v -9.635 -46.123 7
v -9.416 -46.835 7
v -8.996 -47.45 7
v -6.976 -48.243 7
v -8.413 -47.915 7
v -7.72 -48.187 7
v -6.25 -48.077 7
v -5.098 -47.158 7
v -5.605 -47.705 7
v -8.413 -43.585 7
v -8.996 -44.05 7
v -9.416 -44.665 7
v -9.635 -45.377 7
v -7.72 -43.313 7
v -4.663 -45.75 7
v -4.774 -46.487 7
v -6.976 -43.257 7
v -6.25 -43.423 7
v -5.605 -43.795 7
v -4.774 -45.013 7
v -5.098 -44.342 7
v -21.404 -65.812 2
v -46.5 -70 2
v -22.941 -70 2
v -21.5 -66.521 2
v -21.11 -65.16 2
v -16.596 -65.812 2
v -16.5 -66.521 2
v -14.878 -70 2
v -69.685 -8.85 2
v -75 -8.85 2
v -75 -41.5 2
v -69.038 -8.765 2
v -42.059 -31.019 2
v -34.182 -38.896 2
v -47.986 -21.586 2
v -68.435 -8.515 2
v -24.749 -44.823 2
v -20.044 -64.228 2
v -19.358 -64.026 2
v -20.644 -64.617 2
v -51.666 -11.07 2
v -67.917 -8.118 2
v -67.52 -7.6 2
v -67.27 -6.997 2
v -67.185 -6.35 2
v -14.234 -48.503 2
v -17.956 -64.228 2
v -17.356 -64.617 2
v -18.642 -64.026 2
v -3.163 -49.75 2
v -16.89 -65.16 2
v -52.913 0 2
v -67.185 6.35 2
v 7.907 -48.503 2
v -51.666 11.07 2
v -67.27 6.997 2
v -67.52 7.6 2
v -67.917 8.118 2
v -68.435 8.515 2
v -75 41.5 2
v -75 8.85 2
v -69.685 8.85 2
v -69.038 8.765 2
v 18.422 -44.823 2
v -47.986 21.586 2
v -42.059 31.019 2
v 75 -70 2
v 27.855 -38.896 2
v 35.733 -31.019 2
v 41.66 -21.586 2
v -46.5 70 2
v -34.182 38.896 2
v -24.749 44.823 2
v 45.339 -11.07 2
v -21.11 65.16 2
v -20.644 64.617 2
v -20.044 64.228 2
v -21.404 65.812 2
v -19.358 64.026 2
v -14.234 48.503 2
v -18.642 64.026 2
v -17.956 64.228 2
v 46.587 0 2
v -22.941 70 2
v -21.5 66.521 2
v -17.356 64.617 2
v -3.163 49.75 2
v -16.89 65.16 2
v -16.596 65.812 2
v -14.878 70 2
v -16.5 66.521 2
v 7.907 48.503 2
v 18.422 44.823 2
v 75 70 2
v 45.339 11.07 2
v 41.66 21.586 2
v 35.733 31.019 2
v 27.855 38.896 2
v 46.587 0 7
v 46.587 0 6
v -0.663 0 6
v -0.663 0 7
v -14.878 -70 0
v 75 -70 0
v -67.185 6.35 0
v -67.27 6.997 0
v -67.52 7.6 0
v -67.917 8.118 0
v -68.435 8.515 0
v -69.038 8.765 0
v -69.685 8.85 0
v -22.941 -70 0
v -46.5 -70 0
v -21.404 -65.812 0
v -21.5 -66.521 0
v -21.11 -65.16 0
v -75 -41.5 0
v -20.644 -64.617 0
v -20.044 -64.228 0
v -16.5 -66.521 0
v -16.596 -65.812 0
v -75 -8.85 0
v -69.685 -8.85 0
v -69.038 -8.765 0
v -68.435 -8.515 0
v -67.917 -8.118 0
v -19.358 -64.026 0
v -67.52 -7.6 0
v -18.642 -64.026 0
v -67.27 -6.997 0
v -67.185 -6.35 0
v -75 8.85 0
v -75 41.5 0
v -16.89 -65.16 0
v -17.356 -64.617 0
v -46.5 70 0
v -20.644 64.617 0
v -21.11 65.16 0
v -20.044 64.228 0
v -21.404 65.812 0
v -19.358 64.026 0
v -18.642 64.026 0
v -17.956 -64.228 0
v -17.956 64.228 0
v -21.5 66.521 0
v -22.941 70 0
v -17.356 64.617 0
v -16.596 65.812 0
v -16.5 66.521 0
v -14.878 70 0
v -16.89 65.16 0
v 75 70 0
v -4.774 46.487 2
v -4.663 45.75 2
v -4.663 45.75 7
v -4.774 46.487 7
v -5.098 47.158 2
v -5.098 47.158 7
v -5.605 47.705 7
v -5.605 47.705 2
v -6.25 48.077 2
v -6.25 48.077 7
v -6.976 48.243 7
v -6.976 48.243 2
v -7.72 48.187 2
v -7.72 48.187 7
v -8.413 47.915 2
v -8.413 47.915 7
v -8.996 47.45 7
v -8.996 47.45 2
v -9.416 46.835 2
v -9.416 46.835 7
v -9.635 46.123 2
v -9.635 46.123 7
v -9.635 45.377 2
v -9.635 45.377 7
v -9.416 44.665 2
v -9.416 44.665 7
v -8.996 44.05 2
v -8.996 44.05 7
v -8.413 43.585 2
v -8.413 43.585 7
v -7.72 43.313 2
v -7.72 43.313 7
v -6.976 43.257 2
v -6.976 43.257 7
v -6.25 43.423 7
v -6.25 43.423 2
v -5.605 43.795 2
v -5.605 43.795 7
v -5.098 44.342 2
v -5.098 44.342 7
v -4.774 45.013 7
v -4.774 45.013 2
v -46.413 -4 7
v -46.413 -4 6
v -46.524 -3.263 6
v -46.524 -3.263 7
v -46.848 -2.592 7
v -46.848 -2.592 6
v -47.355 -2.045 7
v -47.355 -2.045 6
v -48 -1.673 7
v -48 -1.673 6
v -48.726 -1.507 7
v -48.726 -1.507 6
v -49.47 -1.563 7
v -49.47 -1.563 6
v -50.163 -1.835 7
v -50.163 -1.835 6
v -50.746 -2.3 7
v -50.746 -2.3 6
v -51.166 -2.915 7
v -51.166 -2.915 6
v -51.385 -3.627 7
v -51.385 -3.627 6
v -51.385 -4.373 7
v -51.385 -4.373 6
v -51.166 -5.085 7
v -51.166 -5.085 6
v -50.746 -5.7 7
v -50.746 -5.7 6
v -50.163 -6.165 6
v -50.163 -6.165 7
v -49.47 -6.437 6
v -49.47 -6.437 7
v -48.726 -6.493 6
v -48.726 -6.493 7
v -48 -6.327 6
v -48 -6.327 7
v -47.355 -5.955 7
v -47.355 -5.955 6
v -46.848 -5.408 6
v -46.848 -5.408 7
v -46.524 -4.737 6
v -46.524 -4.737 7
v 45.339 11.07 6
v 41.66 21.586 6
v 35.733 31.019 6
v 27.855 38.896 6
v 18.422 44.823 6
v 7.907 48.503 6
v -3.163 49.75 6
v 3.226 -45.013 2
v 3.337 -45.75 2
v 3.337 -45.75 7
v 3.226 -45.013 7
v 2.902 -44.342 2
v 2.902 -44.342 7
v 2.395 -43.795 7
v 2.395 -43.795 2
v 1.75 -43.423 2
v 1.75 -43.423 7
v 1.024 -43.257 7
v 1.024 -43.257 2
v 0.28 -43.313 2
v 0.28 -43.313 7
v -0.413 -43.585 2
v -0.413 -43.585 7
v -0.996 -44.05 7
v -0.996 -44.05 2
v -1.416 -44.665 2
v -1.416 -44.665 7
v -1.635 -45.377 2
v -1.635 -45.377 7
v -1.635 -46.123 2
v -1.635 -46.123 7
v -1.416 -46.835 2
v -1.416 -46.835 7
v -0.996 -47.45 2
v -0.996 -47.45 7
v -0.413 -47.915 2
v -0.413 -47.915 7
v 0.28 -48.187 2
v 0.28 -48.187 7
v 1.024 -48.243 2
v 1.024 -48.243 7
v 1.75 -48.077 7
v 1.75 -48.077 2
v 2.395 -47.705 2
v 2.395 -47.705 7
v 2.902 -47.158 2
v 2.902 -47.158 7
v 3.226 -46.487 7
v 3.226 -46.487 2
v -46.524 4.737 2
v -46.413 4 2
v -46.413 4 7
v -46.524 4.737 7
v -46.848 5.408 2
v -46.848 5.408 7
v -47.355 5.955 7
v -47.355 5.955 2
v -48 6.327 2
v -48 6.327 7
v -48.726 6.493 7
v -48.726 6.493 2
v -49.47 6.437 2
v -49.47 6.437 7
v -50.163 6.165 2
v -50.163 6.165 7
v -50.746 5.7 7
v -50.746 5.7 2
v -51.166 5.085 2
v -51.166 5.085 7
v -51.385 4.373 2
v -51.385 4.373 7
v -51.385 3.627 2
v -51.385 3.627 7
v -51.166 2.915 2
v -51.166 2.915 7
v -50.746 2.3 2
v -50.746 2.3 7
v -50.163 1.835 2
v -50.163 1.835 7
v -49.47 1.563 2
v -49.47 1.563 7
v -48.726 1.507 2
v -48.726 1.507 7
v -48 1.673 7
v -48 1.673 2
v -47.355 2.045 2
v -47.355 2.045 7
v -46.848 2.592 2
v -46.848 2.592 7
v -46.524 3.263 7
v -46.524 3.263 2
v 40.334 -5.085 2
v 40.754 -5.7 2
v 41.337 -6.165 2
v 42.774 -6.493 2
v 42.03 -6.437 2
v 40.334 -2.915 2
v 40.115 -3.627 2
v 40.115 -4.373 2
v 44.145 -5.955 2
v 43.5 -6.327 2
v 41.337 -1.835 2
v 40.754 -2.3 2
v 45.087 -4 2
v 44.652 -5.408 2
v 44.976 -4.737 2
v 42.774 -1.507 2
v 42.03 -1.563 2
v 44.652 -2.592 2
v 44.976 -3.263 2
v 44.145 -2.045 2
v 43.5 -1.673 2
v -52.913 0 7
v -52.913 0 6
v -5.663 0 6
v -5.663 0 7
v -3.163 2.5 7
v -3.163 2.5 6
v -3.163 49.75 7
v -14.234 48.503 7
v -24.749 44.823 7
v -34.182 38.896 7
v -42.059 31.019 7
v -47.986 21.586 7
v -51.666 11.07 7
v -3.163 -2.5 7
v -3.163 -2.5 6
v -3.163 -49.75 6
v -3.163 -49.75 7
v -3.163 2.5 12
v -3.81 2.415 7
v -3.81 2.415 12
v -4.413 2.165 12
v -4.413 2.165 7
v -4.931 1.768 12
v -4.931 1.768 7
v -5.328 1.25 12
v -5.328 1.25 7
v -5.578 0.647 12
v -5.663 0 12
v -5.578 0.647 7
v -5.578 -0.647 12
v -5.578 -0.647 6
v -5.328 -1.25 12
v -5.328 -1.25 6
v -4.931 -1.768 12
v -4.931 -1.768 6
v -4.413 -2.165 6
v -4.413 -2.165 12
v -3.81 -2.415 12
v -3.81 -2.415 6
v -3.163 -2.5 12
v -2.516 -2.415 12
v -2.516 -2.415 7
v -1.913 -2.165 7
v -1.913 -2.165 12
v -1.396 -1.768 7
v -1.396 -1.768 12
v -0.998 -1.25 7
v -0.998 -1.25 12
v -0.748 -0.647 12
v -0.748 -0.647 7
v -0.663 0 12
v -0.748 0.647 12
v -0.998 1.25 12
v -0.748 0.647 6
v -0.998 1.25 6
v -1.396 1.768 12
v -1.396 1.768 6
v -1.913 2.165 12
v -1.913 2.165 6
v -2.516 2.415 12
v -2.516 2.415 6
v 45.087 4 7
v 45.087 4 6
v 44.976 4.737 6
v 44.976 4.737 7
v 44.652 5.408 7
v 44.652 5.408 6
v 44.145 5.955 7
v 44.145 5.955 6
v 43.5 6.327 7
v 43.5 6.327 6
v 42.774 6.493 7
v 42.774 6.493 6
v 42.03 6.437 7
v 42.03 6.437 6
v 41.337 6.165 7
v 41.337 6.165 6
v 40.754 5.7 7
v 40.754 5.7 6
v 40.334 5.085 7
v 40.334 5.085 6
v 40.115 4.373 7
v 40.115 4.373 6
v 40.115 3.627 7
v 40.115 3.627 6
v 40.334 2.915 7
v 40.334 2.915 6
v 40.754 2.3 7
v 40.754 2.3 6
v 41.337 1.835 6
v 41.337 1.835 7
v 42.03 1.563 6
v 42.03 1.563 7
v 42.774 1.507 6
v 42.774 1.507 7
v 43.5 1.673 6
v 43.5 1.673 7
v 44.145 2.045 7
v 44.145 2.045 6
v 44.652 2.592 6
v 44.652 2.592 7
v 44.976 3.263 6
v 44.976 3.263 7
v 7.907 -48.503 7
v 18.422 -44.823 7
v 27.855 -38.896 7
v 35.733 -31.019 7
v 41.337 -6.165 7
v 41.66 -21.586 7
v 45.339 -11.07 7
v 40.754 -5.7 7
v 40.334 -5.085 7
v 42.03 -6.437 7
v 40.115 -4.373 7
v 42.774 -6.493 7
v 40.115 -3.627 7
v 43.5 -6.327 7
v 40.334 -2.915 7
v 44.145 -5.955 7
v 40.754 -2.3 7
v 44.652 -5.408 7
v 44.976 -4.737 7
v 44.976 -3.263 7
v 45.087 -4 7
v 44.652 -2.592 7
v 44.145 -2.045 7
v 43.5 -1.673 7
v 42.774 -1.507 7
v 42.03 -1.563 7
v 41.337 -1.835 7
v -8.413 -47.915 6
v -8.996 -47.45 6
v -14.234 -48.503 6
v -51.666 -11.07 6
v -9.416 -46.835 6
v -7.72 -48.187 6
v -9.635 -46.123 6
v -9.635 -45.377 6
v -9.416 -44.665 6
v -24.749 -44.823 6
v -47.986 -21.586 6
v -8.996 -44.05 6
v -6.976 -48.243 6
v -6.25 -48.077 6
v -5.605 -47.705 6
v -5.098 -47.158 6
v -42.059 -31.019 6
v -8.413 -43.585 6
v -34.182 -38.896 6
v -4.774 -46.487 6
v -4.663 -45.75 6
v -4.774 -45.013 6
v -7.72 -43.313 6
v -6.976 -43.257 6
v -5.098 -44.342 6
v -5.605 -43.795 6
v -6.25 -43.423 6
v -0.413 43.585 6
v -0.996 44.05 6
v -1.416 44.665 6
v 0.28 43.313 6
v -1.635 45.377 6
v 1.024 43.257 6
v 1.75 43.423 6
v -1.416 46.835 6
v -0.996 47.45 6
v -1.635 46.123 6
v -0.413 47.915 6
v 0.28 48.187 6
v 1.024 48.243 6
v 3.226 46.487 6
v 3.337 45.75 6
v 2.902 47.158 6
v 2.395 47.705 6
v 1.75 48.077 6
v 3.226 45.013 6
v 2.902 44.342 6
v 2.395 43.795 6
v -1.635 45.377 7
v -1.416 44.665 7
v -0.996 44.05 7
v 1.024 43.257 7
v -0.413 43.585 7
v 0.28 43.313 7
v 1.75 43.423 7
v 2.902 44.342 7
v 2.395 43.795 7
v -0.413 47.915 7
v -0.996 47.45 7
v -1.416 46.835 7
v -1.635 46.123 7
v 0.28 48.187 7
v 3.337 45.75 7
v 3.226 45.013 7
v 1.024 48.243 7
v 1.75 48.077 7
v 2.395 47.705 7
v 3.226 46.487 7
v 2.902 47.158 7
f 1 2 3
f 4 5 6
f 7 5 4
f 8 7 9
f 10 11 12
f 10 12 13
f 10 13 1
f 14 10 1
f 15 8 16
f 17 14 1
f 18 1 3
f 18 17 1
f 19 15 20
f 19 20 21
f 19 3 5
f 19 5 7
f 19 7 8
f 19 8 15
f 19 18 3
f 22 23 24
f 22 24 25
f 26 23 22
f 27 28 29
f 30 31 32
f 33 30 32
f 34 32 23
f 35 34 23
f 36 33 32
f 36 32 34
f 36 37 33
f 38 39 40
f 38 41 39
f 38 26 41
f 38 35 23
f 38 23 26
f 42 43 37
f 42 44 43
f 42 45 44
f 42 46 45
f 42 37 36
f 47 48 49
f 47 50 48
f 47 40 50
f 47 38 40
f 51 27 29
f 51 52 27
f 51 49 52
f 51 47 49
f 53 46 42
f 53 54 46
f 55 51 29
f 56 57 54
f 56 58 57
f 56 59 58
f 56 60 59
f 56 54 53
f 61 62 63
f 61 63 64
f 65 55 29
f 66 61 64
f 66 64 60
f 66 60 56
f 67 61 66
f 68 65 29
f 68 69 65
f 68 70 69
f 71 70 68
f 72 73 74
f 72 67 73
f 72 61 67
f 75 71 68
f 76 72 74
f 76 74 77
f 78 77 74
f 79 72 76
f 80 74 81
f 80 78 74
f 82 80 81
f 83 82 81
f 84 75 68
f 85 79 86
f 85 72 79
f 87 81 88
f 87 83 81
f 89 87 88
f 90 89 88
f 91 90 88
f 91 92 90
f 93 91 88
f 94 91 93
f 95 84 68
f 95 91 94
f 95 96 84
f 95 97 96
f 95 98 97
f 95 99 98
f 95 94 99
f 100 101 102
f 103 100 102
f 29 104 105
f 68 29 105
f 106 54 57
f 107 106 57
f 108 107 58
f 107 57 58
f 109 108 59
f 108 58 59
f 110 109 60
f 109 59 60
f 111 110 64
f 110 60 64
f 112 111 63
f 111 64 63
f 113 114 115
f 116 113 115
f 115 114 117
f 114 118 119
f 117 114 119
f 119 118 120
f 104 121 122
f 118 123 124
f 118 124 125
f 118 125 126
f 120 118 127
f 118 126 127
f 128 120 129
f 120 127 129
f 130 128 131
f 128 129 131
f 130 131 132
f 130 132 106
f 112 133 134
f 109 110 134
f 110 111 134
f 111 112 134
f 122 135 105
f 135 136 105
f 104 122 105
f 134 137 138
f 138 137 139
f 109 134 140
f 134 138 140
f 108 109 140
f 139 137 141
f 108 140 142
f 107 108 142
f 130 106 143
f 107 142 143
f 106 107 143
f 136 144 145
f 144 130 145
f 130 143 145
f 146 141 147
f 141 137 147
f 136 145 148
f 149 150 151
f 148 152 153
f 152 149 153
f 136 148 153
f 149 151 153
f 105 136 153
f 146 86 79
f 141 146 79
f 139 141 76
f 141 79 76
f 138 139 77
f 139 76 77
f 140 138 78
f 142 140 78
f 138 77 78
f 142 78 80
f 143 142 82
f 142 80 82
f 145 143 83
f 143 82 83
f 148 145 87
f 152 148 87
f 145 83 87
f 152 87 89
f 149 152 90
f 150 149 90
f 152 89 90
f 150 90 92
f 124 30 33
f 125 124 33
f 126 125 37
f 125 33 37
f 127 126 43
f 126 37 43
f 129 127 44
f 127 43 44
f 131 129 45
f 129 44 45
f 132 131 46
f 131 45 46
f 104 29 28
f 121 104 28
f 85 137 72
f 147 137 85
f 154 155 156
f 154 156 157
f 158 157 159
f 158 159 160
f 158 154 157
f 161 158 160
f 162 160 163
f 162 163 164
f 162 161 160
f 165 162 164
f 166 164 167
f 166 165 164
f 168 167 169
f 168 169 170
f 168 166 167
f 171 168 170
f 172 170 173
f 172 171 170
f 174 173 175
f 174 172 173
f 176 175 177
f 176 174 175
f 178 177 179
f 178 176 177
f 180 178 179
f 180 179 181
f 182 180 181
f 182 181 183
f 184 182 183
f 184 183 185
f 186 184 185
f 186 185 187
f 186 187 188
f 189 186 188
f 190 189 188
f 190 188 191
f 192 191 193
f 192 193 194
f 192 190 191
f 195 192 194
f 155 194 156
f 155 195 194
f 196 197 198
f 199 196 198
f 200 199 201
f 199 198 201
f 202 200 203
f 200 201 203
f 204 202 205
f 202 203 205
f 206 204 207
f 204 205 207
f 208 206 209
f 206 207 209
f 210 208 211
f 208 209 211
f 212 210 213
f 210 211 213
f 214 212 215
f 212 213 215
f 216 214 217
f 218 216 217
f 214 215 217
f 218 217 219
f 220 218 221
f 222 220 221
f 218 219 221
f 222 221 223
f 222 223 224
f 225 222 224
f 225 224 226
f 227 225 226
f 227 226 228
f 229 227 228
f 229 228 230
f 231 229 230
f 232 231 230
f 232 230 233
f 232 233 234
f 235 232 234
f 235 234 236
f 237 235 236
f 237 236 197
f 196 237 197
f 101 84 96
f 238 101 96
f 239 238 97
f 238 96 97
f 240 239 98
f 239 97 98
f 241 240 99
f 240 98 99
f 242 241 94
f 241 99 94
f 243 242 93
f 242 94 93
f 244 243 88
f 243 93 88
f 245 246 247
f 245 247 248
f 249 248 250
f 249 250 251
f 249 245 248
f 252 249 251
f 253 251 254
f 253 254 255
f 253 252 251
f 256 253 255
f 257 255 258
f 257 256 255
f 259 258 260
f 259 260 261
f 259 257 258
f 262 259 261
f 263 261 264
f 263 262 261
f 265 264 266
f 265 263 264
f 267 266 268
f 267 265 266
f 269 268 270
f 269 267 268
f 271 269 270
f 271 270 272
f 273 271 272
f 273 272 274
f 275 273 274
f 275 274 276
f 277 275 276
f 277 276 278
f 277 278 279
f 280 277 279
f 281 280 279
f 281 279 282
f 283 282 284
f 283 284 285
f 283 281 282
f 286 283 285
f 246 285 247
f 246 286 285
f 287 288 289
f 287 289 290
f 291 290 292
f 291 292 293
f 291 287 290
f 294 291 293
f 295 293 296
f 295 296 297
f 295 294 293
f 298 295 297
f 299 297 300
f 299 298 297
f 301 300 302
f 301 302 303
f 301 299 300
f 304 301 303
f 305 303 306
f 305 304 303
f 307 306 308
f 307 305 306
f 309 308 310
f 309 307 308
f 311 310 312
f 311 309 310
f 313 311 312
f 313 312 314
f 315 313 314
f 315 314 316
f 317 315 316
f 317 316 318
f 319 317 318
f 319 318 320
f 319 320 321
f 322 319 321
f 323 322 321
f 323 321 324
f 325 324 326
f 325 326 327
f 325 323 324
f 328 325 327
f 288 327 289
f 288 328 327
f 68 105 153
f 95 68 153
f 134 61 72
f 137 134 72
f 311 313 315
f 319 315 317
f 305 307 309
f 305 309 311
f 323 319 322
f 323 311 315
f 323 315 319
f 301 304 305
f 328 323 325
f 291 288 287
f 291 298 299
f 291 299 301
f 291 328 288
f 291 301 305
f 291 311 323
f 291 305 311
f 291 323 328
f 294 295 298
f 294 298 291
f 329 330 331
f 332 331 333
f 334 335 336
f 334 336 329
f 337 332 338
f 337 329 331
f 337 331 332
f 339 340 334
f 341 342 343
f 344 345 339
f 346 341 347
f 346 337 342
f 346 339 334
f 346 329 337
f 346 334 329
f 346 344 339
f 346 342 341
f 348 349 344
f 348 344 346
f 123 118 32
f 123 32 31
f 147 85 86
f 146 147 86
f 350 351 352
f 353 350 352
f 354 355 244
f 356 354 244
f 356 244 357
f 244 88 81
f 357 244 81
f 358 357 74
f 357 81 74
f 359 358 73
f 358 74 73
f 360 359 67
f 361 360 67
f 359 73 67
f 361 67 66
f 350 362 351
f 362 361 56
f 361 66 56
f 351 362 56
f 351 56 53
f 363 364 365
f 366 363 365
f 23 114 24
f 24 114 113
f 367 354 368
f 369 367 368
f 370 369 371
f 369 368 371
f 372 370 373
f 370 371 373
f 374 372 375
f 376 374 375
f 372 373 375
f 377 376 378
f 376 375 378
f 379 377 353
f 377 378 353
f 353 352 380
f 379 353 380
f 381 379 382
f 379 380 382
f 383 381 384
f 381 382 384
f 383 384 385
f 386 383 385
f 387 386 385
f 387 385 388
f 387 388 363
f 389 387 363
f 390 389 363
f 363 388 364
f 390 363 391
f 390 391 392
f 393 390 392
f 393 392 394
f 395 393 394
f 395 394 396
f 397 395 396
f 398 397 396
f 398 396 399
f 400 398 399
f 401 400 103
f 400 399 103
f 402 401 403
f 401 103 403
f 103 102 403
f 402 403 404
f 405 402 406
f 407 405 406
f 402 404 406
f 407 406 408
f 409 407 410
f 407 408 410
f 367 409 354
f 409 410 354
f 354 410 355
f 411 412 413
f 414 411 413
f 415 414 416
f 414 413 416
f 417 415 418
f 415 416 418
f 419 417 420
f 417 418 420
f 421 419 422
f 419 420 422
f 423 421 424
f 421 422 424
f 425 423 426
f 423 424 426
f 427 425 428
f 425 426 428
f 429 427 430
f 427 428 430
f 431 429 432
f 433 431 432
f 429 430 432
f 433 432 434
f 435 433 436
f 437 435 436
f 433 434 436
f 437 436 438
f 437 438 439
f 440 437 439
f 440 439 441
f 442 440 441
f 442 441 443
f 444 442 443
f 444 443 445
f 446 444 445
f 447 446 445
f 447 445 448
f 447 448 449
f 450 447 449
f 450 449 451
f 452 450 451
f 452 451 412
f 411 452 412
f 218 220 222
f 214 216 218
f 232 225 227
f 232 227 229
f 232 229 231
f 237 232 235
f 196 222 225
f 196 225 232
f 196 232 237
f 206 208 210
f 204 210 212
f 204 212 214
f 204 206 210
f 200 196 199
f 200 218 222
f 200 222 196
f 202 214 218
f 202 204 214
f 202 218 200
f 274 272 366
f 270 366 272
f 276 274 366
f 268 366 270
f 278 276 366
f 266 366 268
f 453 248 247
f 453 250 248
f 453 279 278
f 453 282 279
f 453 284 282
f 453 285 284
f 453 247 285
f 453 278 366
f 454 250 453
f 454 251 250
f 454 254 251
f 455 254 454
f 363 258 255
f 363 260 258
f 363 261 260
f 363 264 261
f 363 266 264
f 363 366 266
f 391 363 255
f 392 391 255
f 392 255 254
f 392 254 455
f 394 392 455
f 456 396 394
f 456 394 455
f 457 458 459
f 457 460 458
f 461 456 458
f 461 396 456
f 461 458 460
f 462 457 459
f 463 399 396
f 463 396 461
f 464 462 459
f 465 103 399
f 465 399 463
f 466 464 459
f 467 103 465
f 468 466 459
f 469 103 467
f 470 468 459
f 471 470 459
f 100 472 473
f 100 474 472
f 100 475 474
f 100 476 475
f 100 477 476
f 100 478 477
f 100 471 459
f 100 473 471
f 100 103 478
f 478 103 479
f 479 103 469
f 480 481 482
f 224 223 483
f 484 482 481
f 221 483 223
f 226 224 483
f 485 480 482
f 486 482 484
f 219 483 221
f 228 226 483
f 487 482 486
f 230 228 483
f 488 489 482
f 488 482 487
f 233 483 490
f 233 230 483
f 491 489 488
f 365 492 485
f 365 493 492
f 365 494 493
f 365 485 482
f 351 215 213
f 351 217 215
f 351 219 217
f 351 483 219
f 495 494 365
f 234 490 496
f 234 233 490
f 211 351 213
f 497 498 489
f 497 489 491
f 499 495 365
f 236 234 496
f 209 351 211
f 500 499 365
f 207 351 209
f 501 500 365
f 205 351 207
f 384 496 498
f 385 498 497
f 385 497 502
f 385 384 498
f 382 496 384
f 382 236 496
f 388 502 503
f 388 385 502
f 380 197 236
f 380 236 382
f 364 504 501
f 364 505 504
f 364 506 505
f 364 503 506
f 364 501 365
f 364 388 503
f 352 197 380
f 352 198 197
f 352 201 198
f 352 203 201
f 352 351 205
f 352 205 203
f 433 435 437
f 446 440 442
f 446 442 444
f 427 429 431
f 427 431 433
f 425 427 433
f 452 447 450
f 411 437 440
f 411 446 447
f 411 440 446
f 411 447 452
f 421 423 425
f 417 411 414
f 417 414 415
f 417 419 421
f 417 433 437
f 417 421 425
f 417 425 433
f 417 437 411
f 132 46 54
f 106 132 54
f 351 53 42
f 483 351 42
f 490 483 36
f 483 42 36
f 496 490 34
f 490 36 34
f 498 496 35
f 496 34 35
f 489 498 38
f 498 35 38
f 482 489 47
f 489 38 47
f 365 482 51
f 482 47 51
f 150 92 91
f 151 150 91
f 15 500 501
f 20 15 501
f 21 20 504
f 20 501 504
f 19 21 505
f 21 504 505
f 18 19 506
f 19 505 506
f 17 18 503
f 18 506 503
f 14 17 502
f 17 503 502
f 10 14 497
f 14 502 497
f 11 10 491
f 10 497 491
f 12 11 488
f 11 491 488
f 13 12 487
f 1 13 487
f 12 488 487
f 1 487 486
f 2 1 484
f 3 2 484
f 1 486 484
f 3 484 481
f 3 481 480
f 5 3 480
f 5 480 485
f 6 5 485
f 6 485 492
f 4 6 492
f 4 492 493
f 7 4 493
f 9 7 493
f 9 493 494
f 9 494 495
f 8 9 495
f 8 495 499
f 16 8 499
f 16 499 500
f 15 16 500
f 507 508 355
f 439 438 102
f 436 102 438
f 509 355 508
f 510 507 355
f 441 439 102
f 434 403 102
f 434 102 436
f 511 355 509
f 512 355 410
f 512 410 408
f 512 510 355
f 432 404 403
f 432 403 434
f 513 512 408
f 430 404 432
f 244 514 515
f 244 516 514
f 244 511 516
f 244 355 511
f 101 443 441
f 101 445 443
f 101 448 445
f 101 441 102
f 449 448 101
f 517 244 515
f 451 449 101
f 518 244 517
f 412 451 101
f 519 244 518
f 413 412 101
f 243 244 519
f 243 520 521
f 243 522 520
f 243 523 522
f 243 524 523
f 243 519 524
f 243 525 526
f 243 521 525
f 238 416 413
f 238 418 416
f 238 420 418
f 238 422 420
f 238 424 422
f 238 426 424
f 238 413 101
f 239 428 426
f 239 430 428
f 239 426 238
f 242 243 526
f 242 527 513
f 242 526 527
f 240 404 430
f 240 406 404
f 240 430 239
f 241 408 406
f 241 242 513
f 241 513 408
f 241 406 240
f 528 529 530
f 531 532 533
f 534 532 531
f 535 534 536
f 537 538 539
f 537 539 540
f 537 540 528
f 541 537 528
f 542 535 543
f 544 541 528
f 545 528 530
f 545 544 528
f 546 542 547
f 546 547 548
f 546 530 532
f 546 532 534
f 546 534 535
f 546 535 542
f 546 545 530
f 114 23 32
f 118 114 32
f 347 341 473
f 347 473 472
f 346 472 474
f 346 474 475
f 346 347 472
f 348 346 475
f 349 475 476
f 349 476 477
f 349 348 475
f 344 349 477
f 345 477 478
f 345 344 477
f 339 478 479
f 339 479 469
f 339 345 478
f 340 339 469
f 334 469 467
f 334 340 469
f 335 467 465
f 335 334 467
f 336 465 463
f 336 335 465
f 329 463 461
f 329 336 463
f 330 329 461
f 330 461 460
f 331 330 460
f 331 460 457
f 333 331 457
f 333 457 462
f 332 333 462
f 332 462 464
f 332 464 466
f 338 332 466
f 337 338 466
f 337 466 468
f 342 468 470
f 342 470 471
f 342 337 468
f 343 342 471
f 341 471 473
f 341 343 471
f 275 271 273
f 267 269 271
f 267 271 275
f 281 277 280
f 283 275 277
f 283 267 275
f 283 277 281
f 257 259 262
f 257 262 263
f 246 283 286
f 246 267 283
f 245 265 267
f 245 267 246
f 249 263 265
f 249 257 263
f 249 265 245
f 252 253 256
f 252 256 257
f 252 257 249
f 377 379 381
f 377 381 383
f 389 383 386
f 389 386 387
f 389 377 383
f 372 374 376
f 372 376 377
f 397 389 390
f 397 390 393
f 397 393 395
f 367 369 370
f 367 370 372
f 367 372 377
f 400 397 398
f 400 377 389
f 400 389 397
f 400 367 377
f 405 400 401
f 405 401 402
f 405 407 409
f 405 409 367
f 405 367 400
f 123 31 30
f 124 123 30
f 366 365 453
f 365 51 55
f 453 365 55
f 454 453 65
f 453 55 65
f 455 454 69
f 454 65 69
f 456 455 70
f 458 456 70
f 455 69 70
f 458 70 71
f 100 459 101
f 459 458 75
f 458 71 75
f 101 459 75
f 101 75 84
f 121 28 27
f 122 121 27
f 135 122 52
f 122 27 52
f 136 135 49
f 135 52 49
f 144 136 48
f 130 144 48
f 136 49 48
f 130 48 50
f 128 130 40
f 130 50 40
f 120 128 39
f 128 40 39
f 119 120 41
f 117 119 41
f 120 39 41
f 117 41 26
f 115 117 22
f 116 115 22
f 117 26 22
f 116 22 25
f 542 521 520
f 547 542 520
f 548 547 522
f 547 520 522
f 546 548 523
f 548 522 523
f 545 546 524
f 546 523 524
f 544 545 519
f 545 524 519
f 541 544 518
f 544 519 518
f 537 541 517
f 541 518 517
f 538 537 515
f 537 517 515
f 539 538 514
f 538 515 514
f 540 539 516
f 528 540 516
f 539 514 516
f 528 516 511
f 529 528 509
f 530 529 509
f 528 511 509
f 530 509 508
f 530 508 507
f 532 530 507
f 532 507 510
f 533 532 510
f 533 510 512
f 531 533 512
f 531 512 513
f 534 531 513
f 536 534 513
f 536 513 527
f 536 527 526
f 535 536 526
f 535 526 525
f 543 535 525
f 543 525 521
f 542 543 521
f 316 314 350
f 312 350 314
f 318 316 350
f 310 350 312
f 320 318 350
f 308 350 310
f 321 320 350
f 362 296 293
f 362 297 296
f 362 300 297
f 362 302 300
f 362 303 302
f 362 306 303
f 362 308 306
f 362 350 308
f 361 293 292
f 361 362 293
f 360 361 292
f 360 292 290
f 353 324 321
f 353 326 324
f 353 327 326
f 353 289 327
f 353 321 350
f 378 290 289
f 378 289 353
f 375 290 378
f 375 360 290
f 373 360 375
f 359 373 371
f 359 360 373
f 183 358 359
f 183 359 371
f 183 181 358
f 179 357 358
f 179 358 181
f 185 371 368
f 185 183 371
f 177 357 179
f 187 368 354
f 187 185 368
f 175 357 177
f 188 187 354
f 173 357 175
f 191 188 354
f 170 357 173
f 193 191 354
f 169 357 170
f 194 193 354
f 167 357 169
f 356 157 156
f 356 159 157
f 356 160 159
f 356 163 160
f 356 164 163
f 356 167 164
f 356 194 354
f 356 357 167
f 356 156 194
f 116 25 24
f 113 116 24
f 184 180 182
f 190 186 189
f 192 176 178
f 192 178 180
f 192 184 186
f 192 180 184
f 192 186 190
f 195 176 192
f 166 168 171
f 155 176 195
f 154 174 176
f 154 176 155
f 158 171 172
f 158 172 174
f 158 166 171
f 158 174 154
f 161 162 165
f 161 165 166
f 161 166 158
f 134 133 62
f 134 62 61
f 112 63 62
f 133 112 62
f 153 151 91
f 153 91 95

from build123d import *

# Parameters (mm, degrees)
F0_W     = 150
F0_H     = 140
F1_DEPTH = 2
F2_R     = 2.5
F3_DEPTH = 5
F4_R     = 2.5
F5_DEPTH = 5
F6_DEPTH = 4
F7_DEPTH = 10


with BuildPart() as f1:
    # F0 (on Top) → F1 (new body)
    with BuildSketch(Plane.XY):
        Rectangle(F0_W, F0_H)
    extrude(amount=F1_DEPTH)

    # F2 (on face) → F3 (cut)
    with BuildSketch(Plane.XY.offset(2)):
        Polygon((-75, 70), (-75, 41.5), (-46.5, 70), align=None)
        with Locations((-64, 57.6)):
            Circle(F2_R, mode=Mode.SUBTRACT)
        Polygon((-46.5, -70), (-75, -41.5), (-75, -70), align=None)
        with Locations((-64, -57.6)):
            Circle(F2_R, mode=Mode.SUBTRACT)
        with BuildLine():
            Line((-67.1845650673, -6.35), (-67.1845650673, 6.35))
            ThreePointArc((-67.1845650673, 6.35), (-67.9167981143, 8.117766953), (-69.6845650673, 8.85))
            Line((-69.6845650673, 8.85), (-75, 8.85))
            Line((-75, 8.85), (-75, -8.85))
            Line((-75, -8.85), (-69.6845650673, -8.85))
            ThreePointArc((-69.6845650673, -8.85), (-67.9167981143, -8.117766953), (-67.1845650673, -6.35))
        make_face()
        with BuildLine():
            Line((-21.499911428, -66.5210440509), (-22.940942165, -70))
            Line((-22.940942165, -70), (-14.8778247705, -70))
            Line((-14.8778247705, -70), (-16.500088572, -66.5210440509))
            ThreePointArc((-16.500088572, -66.5210440509), (-19, -64), (-21.499911428, -66.5210440509))
        make_face()
        with BuildLine():
            Line((-14.8778247705, 70), (-22.940942165, 70))
            Line((-22.940942165, 70), (-21.499911428, 66.5210440509))
            ThreePointArc((-21.499911428, 66.5210440509), (-19, 64), (-16.500088572, 66.5210440509))
            Line((-16.500088572, 66.5210440509), (-14.8778247705, 70))
        make_face()
        with Locations((-64, 57.6)):
            Circle(F2_R)
        with Locations((-64, -57.6)):
            Circle(F2_R)
    extrude(amount=-F3_DEPTH, mode=Mode.SUBTRACT)

    # F4 (on face) → F5 (join)
    with BuildSketch(Plane.XY.offset(2)):
        with BuildLine():
            Line((-3.16328, 2.5), (-3.16328, 49.75))
            ThreePointArc((-3.16328, 49.75), (-38.341842364, 35.178562364), (-52.91328, 0))
            Line((-52.91328, 0), (-5.66328, 0))
            ThreePointArc((-5.66328, 0), (-4.931046953, 1.767766953), (-3.16328, 2.5))
        make_face()
        with Locations((-48.91328, 4)):
            Circle(F4_R, mode=Mode.SUBTRACT)
        with Locations((-7.16328, 45.75)):
            Circle(F4_R, mode=Mode.SUBTRACT)
        with BuildLine():
            ThreePointArc((-3.16328, -49.75), (32.015282364, -35.178562364), (46.58672, 0))
            Line((46.58672, 0), (-0.66328, 0))
            ThreePointArc((-0.66328, 0), (-1.395513047, -1.767766953), (-3.16328, -2.5))
            Line((-3.16328, -2.5), (-3.16328, -49.75))
        make_face()
        with Locations((0.83672, -45.75)):
            Circle(F4_R, mode=Mode.SUBTRACT)
        with Locations((42.58672, -4)):
            Circle(F4_R, mode=Mode.SUBTRACT)
        with Locations((0.83672, 45.75)):
            Circle(F4_R)
        with Locations((42.58672, 4)):
            Circle(F4_R)
        with Locations((-7.16328, -45.75)):
            Circle(F4_R)
        with Locations((-48.91328, -4)):
            Circle(F4_R)
        with BuildLine():
            ThreePointArc((-5.66328, 0), (-4.931046953, -1.767766953), (-3.16328, -2.5))
            Line((-3.16328, -2.5), (-3.16328, 0))
            Line((-3.16328, 0), (-5.66328, 0))
        make_face()
        with BuildLine():
            Line((-3.16328, 0), (-0.66328, 0))
            ThreePointArc((-0.66328, 0), (-1.395513047, 1.767766953), (-3.16328, 2.5))
            Line((-3.16328, 2.5), (-3.16328, 0))
        make_face()
        with BuildLine():
            ThreePointArc((-3.16328, -2.5), (-1.395513047, -1.767766953), (-0.66328, 0))
            Line((-0.66328, 0), (-3.16328, 0))
            Line((-3.16328, 0), (-3.16328, -2.5))
        make_face()
        with BuildLine():
            Line((-3.16328, 0), (-3.16328, 2.5))
            ThreePointArc((-3.16328, 2.5), (-4.931046953, 1.767766953), (-5.66328, 0))
            Line((-5.66328, 0), (-3.16328, 0))
        make_face()
    extrude(amount=F5_DEPTH)

    # F4 (on face) → F6 (join)
    with BuildSketch(Plane.XY.offset(2)):
        with BuildLine():
            ThreePointArc((-52.91328, 0), (-38.341842364, -35.178562364), (-3.16328, -49.75))
            Line((-3.16328, -49.75), (-3.16328, -2.5))
            ThreePointArc((-3.16328, -2.5), (-4.931046953, -1.767766953), (-5.66328, 0))
            Line((-5.66328, 0), (-52.91328, 0))
        make_face()
        with Locations((-7.16328, -45.75)):
            Circle(F4_R, mode=Mode.SUBTRACT)
        with Locations((-48.91328, -4)):
            Circle(F4_R, mode=Mode.SUBTRACT)
        with BuildLine():
            Line((-0.66328, 0), (46.58672, 0))
            ThreePointArc((46.58672, 0), (32.015282364, 35.178562364), (-3.16328, 49.75))
            Line((-3.16328, 49.75), (-3.16328, 2.5))
            ThreePointArc((-3.16328, 2.5), (-1.395513047, 1.767766953), (-0.66328, 0))
        make_face()
        with Locations((42.58672, 4)):
            Circle(F4_R, mode=Mode.SUBTRACT)
        with Locations((0.83672, 45.75)):
            Circle(F4_R, mode=Mode.SUBTRACT)
    extrude(amount=F6_DEPTH)

    # F4 (on face) → F7 (join)
    with BuildSketch(Plane.XY.offset(2)):
        with BuildLine():
            ThreePointArc((-3.16328, -2.5), (-1.395513047, -1.767766953), (-0.66328, 0))
            Line((-0.66328, 0), (-3.16328, 0))
            Line((-3.16328, 0), (-3.16328, -2.5))
        make_face()
        with BuildLine():
            Line((-3.16328, 0), (-0.66328, 0))
            ThreePointArc((-0.66328, 0), (-1.395513047, 1.767766953), (-3.16328, 2.5))
            Line((-3.16328, 2.5), (-3.16328, 0))
        make_face()
        with BuildLine():
            Line((-3.16328, 0), (-3.16328, 2.5))
            ThreePointArc((-3.16328, 2.5), (-4.931046953, 1.767766953), (-5.66328, 0))
            Line((-5.66328, 0), (-3.16328, 0))
        make_face()
        with BuildLine():
            ThreePointArc((-5.66328, 0), (-4.931046953, -1.767766953), (-3.16328, -2.5))
            Line((-3.16328, -2.5), (-3.16328, 0))
            Line((-3.16328, 0), (-5.66328, 0))
        make_face()
    extrude(amount=F7_DEPTH)


solid = f1.part
